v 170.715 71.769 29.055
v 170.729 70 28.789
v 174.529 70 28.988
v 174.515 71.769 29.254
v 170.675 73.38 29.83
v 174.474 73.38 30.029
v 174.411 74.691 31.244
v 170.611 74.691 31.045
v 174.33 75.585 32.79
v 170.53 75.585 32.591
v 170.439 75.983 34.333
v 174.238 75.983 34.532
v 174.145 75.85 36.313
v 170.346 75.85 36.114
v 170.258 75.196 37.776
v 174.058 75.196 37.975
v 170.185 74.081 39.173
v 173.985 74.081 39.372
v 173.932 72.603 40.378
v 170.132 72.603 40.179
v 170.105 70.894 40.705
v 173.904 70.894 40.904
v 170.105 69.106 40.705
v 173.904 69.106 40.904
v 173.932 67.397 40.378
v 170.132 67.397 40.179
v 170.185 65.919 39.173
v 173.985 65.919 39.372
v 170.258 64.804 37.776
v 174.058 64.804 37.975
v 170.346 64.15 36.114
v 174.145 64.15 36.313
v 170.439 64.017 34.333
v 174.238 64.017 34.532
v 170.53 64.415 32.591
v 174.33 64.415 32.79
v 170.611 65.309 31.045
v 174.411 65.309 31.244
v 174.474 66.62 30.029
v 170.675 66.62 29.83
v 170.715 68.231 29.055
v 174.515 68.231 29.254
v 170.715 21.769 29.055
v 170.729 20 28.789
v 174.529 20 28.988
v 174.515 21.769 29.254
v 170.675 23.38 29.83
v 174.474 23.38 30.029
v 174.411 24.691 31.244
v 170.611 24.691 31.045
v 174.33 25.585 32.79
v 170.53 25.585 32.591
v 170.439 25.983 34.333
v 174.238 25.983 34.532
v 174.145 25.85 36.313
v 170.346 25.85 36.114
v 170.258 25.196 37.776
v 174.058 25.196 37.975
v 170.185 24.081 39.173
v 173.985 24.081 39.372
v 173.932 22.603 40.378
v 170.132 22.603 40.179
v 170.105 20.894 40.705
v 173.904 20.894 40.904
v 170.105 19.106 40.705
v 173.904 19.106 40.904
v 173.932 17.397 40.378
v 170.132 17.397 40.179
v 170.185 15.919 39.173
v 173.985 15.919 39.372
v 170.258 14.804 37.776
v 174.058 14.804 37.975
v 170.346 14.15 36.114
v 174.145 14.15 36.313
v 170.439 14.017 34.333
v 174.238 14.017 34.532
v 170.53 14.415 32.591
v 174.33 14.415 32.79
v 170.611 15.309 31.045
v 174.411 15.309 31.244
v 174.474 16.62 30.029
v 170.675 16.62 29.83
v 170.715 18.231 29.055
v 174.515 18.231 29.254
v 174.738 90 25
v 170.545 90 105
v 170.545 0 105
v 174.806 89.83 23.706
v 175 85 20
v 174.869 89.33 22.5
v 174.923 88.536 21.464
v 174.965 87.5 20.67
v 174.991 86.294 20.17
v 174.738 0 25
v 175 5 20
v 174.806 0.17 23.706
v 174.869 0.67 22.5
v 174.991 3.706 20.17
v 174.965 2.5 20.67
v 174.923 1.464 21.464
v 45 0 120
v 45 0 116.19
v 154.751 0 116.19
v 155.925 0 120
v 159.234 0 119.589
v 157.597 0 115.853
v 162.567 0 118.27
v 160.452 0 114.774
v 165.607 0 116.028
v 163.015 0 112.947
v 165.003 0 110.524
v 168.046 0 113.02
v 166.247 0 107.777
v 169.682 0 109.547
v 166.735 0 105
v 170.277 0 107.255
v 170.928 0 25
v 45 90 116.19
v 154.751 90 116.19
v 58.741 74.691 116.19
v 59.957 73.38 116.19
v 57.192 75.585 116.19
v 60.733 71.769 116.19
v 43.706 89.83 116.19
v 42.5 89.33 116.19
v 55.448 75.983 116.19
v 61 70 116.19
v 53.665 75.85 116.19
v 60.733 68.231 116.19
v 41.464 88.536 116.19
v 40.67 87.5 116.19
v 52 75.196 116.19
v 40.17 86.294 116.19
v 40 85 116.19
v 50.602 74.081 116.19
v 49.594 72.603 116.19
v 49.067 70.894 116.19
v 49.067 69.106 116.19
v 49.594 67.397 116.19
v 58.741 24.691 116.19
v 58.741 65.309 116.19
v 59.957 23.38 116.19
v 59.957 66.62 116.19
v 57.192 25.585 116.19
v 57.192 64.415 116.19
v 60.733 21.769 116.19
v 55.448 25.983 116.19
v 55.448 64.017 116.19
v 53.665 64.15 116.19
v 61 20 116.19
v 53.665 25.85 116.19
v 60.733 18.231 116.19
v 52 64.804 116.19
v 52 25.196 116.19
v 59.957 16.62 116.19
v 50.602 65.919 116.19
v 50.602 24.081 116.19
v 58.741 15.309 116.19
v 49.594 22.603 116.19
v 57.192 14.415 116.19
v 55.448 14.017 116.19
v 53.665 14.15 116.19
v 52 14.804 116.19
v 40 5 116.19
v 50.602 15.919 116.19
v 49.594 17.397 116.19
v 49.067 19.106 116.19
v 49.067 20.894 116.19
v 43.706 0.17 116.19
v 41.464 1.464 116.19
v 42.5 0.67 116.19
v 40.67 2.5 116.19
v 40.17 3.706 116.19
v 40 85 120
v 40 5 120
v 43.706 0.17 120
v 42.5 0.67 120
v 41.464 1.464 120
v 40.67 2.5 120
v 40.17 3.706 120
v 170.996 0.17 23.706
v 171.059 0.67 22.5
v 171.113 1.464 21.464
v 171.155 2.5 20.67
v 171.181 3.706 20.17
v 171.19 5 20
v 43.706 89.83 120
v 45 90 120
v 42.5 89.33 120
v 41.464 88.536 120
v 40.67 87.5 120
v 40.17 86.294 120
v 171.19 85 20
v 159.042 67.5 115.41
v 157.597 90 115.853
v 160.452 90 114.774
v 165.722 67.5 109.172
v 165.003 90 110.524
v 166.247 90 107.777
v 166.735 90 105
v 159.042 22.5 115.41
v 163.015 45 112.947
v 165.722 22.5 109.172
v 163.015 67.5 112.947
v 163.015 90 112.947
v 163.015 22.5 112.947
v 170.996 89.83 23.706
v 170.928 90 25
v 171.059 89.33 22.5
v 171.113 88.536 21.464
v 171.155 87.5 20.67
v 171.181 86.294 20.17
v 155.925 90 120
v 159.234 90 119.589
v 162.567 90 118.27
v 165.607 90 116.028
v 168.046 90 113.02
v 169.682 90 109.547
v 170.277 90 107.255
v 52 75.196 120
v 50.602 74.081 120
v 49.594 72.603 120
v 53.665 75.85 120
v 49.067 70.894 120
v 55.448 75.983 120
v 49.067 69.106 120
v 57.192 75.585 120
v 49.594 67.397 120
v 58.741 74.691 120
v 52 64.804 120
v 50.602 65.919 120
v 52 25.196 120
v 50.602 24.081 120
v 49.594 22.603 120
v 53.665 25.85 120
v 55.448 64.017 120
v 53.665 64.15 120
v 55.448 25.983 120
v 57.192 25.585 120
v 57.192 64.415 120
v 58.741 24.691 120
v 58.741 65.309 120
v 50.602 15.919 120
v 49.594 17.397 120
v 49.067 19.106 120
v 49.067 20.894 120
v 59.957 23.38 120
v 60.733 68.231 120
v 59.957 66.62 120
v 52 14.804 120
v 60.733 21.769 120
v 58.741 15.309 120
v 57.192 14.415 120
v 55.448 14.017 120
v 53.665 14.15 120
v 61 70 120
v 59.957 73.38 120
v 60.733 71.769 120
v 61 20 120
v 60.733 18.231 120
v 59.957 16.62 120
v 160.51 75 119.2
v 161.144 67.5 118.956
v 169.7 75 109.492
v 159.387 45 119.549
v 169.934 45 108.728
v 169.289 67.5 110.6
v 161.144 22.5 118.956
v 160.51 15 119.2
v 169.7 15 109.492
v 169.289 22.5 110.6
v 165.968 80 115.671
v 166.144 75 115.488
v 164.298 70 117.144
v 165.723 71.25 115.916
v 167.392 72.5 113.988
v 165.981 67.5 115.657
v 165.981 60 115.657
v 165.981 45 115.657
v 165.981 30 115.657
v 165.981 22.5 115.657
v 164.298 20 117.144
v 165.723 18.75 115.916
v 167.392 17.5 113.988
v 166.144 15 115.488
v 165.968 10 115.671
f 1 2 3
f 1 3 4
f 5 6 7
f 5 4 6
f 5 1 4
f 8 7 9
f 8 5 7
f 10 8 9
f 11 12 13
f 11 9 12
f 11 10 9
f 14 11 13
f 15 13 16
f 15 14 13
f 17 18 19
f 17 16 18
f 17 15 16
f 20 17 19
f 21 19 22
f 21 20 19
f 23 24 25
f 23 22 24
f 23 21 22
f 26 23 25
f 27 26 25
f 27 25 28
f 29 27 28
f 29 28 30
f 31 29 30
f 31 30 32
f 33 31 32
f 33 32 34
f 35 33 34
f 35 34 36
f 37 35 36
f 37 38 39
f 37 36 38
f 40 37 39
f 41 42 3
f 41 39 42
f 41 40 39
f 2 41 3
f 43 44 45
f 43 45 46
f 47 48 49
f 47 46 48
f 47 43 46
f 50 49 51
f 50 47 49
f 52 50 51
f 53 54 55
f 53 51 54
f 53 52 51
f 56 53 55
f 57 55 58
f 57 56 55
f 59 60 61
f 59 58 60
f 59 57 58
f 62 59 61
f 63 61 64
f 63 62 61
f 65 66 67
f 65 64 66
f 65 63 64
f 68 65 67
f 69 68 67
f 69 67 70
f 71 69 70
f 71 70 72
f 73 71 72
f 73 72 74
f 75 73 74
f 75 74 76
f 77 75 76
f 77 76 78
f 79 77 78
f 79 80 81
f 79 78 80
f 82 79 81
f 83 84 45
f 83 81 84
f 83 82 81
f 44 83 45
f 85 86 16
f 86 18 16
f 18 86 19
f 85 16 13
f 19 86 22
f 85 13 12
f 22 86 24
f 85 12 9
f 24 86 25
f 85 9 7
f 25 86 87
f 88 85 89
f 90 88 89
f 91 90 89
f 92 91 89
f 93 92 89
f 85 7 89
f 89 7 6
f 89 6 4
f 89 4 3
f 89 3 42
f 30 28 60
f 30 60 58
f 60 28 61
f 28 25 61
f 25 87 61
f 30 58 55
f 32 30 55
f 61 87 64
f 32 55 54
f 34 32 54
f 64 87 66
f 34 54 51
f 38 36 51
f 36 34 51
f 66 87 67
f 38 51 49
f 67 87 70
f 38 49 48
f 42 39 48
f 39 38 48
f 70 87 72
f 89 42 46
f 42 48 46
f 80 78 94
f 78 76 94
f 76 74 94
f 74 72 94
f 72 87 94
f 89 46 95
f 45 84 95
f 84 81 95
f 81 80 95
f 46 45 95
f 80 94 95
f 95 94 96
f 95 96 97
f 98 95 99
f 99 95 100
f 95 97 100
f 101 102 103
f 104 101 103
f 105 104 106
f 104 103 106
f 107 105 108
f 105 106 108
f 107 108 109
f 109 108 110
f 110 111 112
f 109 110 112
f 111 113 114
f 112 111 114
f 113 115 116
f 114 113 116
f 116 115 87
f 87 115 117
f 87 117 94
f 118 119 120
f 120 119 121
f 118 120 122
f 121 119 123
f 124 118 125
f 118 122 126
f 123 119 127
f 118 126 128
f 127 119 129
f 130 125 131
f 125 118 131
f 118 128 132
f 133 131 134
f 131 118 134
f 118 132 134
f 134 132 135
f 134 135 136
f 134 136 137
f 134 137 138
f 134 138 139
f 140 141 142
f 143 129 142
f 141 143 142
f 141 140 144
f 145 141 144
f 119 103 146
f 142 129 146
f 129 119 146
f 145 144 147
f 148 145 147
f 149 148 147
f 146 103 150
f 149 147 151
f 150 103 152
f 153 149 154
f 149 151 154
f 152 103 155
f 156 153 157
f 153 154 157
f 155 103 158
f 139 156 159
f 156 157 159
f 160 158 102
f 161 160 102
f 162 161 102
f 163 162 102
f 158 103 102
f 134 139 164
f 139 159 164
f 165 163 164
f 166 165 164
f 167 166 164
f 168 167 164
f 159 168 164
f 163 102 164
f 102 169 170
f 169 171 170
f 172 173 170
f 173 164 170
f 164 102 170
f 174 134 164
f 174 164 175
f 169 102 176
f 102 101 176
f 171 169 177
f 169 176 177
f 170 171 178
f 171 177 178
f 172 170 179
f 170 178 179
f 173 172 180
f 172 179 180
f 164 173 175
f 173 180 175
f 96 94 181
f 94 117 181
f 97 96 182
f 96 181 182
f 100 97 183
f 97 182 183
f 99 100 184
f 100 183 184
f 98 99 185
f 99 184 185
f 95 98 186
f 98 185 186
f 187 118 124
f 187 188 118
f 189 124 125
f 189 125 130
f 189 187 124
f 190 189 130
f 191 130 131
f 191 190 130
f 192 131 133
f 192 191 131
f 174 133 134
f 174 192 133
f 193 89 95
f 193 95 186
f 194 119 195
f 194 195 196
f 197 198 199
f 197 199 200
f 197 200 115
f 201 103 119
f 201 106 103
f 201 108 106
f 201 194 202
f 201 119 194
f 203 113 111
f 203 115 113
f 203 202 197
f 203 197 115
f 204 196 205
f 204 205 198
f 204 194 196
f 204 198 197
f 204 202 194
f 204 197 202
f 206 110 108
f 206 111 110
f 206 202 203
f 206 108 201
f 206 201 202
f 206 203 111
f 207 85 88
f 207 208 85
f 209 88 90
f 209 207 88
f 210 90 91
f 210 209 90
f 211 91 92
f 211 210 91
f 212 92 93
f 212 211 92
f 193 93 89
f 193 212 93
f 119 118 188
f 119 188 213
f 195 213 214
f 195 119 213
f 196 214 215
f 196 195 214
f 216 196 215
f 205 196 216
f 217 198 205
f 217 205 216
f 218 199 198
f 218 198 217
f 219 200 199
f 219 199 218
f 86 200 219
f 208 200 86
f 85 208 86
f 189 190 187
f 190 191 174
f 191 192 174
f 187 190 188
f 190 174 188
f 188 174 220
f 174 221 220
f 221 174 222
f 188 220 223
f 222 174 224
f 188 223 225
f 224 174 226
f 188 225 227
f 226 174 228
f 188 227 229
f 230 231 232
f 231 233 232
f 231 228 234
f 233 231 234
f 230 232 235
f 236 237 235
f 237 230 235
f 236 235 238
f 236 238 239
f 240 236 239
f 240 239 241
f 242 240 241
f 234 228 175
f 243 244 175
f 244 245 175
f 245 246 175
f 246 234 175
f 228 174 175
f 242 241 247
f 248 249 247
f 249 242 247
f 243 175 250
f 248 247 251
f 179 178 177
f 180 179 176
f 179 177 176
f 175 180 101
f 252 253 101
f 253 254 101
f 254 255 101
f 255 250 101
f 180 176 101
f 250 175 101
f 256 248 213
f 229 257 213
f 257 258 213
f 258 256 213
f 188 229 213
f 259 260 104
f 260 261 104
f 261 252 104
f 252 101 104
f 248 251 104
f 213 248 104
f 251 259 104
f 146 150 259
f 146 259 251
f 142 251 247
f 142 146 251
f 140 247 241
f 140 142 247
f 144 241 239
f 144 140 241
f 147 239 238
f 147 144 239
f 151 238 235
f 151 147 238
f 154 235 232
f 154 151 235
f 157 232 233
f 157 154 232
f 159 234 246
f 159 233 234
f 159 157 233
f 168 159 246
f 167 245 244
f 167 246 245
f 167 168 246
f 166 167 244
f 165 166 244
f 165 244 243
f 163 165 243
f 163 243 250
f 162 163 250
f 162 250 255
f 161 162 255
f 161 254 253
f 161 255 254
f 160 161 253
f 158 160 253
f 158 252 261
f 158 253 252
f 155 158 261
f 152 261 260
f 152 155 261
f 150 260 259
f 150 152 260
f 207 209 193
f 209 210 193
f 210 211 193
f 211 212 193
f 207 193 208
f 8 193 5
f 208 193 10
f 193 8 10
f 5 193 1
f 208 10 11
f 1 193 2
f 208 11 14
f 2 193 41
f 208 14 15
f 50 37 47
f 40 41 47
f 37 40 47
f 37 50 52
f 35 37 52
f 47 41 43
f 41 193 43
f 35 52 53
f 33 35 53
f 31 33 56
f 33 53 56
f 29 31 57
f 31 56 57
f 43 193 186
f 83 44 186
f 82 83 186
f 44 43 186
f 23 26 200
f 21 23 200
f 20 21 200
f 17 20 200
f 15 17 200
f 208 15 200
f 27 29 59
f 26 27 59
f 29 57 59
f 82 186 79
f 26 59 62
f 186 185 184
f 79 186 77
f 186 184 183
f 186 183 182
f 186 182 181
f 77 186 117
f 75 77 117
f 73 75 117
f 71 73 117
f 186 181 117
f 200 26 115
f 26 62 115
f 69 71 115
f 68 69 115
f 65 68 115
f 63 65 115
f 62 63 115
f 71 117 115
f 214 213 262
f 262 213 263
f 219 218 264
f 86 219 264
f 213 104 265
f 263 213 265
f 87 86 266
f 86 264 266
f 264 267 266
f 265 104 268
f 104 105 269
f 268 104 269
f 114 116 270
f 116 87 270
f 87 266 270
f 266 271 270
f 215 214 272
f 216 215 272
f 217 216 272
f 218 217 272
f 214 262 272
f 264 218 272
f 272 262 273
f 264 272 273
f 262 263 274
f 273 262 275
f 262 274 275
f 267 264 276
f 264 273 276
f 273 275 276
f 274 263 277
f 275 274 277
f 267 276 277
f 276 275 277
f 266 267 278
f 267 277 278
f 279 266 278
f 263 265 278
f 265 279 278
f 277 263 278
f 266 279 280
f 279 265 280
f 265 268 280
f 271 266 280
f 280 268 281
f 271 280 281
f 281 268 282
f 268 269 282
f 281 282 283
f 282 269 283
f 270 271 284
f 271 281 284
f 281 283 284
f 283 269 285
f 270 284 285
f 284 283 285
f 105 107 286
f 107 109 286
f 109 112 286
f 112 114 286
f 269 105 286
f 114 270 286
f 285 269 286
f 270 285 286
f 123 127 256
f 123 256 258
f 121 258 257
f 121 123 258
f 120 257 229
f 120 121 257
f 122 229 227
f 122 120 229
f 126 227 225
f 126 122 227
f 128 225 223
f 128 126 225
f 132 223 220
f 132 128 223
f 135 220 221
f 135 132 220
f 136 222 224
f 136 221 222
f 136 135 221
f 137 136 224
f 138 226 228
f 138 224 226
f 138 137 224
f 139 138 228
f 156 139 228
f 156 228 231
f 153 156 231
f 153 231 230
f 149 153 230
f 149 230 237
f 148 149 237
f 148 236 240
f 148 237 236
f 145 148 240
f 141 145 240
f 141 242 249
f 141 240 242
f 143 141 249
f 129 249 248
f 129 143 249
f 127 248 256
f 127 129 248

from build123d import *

# Parameters (mm, degrees)
BOSS_EXTRUDE1_DEPTH     = 90
CUT_EXTRUDE1_DEPTH      = 221.737400712
CUT_EXTRUDE1_DEPTH_BACK = 221.737400712
SKETCH3_R               = 6
CUT_EXTRUDE2_DEPTH      = 203.489832762
CUT_EXTRUDE2_DEPTH_BACK = 203.489832762
SKETCH4_R               = 6
FILLET1_R               = 5
BOSS_EXTRUDE2_DEPTH     = 90
SAVE_BODIES1_DEPTH      = 90


# Read off the part's stored shape, not the designer's step: Save Bodies1
with BuildPart() as part:
    # Sketch1 → Boss-Extrude1 (new body)
    with BuildSketch(Plane(origin=(0, 0, 0), x_dir=(1, 0, 0), z_dir=(0, 1, 0))):
        with BuildLine():
            Line((154.751233709, -116.19), (40, -116.19))
            Line((40, -116.19), (40, -120))
            Line((40, -120), (155.92492368, -120))
            add(Edge.make_bspline(
                [(155.92492368, -120), (169.759222072, -120), (170.545338761, -105)],
                knots=[0, 0, 0, 1.513941954, 1.513941954, 1.513941954], degree=2, weights=[1, 0.726919441, 1]))
            Line((170.545338761, -105), (175, -20))
            Line((175, -20), (171.19, -20))
            Line((171.19, -20), (166.735338761, -105))
            add(Edge.make_bspline(
                [(154.751233709, -116.19), (166.148895711, -116.19), (166.735338761, -105)],
                knots=[1.570796327, 1.570796327, 1.570796327, 3.090116999, 3.090116999, 3.090116999], degree=2, weights=[1, 0.725069971, 1]))
        make_face()
    extrude(amount=BOSS_EXTRUDE1_DEPTH)

    # Sketch3 → Cut-Extrude1 (cut, two sides: drawn at the far end of the back side and taken through both)
    with BuildSketch(Plane.XY.offset(120).offset(-CUT_EXTRUDE1_DEPTH_BACK)):
        with Locations((55, 70)):
            Circle(SKETCH3_R)
        with Locations((55, 20)):
            Circle(SKETCH3_R)
    extrude(amount=CUT_EXTRUDE1_DEPTH + CUT_EXTRUDE1_DEPTH_BACK, mode=Mode.SUBTRACT)

    # Sketch4 → Cut-Extrude2 (cut, two sides: drawn at the far end of the back side and taken through both)
    with BuildSketch(Plane(origin=(176.046719125, 0, 0.027409305), x_dir=(0.052335956242940504, 0, -0.9986295347545742), z_dir=(0.9986295347545742, 0, 0.052335956242940504)).offset(-CUT_EXTRUDE2_DEPTH_BACK)):
        with Locations((-35, 70)):
            Circle(SKETCH4_R)
        with Locations((-35, 20)):
            Circle(SKETCH4_R)
    extrude(amount=CUT_EXTRUDE2_DEPTH + CUT_EXTRUDE2_DEPTH_BACK, mode=Mode.SUBTRACT)

    # Fillet1
    fillet1_edges = [part.edges().sort_by_distance(p)[0] for p in [
        (173.095, 0, 20),
        (173.095, 90, 20),
        (40, 90, 118.095),
        (40, 0, 118.095),
    ]]
    fillet(fillet1_edges, radius=FILLET1_R)


with BuildPart() as body_2:
    # Sketch5 → Boss-Extrude2 (new body)
    with BuildSketch(Plane(origin=(0, 0, 0), x_dir=(1, 0, 0), z_dir=(0, 1, 0))):
        with BuildLine():
            Line((154.751233709, -116.19), (40, -116.19))
            Line((40, -116.19), (40, -96.19))
            Line((40, -96.19), (128.217759962, -96.19))
            ThreePointArc((128.217759962, -96.19), (141.984851476, -90.69748742), (148.190350657, -77.236719125))
            Line((148.190350657, -77.236719125), (151.19, -20))
            Line((151.19, -20), (171.19, -20))
            Line((171.19, -20), (166.735338761, -105))
            add(Edge.make_bspline(
                [(154.751233709, -116.19), (166.148895711, -116.19), (166.735338761, -105)],
                knots=[1.570796327, 1.570796327, 1.570796327, 3.090116999, 3.090116999, 3.090116999], degree=2, weights=[1, 0.725069971, 1]))
        make_face()
    extrude(amount=BOSS_EXTRUDE2_DEPTH)

    # Save Bodies1 outline → Save Bodies1 (cut)
    with BuildSketch(Plane(origin=(0, 0, 0), x_dir=(1, 0, 0), z_dir=(0, 1, 0))):
        with BuildLine():
            Line((171.19, -20), (151.19, -20))
            Line((151.19, -20), (148.190350657, -77.236719125))
            ThreePointArc((148.190350657, -77.236719125), (141.984851476, -90.69748742), (128.217759962, -96.19))
            Line((128.217759962, -96.19), (40, -96.19))
            Line((40, -96.19), (40, -116.19))
            Line((40, -116.19), (154.751233709, -116.19))
            add(Edge.make_bspline(
                [(166.735338761, -105), (166.148895711, -116.19), (154.751233709, -116.19)],
                knots=[3.193068309, 3.193068309, 3.193068309, 4.71238898, 4.71238898, 4.71238898], degree=2, weights=[1, 0.725069971, 1]))
            Line((166.735338761, -105), (171.19, -20))
        make_face()
    extrude(amount=SAVE_BODIES1_DEPTH, mode=Mode.SUBTRACT)


solid = part.part
